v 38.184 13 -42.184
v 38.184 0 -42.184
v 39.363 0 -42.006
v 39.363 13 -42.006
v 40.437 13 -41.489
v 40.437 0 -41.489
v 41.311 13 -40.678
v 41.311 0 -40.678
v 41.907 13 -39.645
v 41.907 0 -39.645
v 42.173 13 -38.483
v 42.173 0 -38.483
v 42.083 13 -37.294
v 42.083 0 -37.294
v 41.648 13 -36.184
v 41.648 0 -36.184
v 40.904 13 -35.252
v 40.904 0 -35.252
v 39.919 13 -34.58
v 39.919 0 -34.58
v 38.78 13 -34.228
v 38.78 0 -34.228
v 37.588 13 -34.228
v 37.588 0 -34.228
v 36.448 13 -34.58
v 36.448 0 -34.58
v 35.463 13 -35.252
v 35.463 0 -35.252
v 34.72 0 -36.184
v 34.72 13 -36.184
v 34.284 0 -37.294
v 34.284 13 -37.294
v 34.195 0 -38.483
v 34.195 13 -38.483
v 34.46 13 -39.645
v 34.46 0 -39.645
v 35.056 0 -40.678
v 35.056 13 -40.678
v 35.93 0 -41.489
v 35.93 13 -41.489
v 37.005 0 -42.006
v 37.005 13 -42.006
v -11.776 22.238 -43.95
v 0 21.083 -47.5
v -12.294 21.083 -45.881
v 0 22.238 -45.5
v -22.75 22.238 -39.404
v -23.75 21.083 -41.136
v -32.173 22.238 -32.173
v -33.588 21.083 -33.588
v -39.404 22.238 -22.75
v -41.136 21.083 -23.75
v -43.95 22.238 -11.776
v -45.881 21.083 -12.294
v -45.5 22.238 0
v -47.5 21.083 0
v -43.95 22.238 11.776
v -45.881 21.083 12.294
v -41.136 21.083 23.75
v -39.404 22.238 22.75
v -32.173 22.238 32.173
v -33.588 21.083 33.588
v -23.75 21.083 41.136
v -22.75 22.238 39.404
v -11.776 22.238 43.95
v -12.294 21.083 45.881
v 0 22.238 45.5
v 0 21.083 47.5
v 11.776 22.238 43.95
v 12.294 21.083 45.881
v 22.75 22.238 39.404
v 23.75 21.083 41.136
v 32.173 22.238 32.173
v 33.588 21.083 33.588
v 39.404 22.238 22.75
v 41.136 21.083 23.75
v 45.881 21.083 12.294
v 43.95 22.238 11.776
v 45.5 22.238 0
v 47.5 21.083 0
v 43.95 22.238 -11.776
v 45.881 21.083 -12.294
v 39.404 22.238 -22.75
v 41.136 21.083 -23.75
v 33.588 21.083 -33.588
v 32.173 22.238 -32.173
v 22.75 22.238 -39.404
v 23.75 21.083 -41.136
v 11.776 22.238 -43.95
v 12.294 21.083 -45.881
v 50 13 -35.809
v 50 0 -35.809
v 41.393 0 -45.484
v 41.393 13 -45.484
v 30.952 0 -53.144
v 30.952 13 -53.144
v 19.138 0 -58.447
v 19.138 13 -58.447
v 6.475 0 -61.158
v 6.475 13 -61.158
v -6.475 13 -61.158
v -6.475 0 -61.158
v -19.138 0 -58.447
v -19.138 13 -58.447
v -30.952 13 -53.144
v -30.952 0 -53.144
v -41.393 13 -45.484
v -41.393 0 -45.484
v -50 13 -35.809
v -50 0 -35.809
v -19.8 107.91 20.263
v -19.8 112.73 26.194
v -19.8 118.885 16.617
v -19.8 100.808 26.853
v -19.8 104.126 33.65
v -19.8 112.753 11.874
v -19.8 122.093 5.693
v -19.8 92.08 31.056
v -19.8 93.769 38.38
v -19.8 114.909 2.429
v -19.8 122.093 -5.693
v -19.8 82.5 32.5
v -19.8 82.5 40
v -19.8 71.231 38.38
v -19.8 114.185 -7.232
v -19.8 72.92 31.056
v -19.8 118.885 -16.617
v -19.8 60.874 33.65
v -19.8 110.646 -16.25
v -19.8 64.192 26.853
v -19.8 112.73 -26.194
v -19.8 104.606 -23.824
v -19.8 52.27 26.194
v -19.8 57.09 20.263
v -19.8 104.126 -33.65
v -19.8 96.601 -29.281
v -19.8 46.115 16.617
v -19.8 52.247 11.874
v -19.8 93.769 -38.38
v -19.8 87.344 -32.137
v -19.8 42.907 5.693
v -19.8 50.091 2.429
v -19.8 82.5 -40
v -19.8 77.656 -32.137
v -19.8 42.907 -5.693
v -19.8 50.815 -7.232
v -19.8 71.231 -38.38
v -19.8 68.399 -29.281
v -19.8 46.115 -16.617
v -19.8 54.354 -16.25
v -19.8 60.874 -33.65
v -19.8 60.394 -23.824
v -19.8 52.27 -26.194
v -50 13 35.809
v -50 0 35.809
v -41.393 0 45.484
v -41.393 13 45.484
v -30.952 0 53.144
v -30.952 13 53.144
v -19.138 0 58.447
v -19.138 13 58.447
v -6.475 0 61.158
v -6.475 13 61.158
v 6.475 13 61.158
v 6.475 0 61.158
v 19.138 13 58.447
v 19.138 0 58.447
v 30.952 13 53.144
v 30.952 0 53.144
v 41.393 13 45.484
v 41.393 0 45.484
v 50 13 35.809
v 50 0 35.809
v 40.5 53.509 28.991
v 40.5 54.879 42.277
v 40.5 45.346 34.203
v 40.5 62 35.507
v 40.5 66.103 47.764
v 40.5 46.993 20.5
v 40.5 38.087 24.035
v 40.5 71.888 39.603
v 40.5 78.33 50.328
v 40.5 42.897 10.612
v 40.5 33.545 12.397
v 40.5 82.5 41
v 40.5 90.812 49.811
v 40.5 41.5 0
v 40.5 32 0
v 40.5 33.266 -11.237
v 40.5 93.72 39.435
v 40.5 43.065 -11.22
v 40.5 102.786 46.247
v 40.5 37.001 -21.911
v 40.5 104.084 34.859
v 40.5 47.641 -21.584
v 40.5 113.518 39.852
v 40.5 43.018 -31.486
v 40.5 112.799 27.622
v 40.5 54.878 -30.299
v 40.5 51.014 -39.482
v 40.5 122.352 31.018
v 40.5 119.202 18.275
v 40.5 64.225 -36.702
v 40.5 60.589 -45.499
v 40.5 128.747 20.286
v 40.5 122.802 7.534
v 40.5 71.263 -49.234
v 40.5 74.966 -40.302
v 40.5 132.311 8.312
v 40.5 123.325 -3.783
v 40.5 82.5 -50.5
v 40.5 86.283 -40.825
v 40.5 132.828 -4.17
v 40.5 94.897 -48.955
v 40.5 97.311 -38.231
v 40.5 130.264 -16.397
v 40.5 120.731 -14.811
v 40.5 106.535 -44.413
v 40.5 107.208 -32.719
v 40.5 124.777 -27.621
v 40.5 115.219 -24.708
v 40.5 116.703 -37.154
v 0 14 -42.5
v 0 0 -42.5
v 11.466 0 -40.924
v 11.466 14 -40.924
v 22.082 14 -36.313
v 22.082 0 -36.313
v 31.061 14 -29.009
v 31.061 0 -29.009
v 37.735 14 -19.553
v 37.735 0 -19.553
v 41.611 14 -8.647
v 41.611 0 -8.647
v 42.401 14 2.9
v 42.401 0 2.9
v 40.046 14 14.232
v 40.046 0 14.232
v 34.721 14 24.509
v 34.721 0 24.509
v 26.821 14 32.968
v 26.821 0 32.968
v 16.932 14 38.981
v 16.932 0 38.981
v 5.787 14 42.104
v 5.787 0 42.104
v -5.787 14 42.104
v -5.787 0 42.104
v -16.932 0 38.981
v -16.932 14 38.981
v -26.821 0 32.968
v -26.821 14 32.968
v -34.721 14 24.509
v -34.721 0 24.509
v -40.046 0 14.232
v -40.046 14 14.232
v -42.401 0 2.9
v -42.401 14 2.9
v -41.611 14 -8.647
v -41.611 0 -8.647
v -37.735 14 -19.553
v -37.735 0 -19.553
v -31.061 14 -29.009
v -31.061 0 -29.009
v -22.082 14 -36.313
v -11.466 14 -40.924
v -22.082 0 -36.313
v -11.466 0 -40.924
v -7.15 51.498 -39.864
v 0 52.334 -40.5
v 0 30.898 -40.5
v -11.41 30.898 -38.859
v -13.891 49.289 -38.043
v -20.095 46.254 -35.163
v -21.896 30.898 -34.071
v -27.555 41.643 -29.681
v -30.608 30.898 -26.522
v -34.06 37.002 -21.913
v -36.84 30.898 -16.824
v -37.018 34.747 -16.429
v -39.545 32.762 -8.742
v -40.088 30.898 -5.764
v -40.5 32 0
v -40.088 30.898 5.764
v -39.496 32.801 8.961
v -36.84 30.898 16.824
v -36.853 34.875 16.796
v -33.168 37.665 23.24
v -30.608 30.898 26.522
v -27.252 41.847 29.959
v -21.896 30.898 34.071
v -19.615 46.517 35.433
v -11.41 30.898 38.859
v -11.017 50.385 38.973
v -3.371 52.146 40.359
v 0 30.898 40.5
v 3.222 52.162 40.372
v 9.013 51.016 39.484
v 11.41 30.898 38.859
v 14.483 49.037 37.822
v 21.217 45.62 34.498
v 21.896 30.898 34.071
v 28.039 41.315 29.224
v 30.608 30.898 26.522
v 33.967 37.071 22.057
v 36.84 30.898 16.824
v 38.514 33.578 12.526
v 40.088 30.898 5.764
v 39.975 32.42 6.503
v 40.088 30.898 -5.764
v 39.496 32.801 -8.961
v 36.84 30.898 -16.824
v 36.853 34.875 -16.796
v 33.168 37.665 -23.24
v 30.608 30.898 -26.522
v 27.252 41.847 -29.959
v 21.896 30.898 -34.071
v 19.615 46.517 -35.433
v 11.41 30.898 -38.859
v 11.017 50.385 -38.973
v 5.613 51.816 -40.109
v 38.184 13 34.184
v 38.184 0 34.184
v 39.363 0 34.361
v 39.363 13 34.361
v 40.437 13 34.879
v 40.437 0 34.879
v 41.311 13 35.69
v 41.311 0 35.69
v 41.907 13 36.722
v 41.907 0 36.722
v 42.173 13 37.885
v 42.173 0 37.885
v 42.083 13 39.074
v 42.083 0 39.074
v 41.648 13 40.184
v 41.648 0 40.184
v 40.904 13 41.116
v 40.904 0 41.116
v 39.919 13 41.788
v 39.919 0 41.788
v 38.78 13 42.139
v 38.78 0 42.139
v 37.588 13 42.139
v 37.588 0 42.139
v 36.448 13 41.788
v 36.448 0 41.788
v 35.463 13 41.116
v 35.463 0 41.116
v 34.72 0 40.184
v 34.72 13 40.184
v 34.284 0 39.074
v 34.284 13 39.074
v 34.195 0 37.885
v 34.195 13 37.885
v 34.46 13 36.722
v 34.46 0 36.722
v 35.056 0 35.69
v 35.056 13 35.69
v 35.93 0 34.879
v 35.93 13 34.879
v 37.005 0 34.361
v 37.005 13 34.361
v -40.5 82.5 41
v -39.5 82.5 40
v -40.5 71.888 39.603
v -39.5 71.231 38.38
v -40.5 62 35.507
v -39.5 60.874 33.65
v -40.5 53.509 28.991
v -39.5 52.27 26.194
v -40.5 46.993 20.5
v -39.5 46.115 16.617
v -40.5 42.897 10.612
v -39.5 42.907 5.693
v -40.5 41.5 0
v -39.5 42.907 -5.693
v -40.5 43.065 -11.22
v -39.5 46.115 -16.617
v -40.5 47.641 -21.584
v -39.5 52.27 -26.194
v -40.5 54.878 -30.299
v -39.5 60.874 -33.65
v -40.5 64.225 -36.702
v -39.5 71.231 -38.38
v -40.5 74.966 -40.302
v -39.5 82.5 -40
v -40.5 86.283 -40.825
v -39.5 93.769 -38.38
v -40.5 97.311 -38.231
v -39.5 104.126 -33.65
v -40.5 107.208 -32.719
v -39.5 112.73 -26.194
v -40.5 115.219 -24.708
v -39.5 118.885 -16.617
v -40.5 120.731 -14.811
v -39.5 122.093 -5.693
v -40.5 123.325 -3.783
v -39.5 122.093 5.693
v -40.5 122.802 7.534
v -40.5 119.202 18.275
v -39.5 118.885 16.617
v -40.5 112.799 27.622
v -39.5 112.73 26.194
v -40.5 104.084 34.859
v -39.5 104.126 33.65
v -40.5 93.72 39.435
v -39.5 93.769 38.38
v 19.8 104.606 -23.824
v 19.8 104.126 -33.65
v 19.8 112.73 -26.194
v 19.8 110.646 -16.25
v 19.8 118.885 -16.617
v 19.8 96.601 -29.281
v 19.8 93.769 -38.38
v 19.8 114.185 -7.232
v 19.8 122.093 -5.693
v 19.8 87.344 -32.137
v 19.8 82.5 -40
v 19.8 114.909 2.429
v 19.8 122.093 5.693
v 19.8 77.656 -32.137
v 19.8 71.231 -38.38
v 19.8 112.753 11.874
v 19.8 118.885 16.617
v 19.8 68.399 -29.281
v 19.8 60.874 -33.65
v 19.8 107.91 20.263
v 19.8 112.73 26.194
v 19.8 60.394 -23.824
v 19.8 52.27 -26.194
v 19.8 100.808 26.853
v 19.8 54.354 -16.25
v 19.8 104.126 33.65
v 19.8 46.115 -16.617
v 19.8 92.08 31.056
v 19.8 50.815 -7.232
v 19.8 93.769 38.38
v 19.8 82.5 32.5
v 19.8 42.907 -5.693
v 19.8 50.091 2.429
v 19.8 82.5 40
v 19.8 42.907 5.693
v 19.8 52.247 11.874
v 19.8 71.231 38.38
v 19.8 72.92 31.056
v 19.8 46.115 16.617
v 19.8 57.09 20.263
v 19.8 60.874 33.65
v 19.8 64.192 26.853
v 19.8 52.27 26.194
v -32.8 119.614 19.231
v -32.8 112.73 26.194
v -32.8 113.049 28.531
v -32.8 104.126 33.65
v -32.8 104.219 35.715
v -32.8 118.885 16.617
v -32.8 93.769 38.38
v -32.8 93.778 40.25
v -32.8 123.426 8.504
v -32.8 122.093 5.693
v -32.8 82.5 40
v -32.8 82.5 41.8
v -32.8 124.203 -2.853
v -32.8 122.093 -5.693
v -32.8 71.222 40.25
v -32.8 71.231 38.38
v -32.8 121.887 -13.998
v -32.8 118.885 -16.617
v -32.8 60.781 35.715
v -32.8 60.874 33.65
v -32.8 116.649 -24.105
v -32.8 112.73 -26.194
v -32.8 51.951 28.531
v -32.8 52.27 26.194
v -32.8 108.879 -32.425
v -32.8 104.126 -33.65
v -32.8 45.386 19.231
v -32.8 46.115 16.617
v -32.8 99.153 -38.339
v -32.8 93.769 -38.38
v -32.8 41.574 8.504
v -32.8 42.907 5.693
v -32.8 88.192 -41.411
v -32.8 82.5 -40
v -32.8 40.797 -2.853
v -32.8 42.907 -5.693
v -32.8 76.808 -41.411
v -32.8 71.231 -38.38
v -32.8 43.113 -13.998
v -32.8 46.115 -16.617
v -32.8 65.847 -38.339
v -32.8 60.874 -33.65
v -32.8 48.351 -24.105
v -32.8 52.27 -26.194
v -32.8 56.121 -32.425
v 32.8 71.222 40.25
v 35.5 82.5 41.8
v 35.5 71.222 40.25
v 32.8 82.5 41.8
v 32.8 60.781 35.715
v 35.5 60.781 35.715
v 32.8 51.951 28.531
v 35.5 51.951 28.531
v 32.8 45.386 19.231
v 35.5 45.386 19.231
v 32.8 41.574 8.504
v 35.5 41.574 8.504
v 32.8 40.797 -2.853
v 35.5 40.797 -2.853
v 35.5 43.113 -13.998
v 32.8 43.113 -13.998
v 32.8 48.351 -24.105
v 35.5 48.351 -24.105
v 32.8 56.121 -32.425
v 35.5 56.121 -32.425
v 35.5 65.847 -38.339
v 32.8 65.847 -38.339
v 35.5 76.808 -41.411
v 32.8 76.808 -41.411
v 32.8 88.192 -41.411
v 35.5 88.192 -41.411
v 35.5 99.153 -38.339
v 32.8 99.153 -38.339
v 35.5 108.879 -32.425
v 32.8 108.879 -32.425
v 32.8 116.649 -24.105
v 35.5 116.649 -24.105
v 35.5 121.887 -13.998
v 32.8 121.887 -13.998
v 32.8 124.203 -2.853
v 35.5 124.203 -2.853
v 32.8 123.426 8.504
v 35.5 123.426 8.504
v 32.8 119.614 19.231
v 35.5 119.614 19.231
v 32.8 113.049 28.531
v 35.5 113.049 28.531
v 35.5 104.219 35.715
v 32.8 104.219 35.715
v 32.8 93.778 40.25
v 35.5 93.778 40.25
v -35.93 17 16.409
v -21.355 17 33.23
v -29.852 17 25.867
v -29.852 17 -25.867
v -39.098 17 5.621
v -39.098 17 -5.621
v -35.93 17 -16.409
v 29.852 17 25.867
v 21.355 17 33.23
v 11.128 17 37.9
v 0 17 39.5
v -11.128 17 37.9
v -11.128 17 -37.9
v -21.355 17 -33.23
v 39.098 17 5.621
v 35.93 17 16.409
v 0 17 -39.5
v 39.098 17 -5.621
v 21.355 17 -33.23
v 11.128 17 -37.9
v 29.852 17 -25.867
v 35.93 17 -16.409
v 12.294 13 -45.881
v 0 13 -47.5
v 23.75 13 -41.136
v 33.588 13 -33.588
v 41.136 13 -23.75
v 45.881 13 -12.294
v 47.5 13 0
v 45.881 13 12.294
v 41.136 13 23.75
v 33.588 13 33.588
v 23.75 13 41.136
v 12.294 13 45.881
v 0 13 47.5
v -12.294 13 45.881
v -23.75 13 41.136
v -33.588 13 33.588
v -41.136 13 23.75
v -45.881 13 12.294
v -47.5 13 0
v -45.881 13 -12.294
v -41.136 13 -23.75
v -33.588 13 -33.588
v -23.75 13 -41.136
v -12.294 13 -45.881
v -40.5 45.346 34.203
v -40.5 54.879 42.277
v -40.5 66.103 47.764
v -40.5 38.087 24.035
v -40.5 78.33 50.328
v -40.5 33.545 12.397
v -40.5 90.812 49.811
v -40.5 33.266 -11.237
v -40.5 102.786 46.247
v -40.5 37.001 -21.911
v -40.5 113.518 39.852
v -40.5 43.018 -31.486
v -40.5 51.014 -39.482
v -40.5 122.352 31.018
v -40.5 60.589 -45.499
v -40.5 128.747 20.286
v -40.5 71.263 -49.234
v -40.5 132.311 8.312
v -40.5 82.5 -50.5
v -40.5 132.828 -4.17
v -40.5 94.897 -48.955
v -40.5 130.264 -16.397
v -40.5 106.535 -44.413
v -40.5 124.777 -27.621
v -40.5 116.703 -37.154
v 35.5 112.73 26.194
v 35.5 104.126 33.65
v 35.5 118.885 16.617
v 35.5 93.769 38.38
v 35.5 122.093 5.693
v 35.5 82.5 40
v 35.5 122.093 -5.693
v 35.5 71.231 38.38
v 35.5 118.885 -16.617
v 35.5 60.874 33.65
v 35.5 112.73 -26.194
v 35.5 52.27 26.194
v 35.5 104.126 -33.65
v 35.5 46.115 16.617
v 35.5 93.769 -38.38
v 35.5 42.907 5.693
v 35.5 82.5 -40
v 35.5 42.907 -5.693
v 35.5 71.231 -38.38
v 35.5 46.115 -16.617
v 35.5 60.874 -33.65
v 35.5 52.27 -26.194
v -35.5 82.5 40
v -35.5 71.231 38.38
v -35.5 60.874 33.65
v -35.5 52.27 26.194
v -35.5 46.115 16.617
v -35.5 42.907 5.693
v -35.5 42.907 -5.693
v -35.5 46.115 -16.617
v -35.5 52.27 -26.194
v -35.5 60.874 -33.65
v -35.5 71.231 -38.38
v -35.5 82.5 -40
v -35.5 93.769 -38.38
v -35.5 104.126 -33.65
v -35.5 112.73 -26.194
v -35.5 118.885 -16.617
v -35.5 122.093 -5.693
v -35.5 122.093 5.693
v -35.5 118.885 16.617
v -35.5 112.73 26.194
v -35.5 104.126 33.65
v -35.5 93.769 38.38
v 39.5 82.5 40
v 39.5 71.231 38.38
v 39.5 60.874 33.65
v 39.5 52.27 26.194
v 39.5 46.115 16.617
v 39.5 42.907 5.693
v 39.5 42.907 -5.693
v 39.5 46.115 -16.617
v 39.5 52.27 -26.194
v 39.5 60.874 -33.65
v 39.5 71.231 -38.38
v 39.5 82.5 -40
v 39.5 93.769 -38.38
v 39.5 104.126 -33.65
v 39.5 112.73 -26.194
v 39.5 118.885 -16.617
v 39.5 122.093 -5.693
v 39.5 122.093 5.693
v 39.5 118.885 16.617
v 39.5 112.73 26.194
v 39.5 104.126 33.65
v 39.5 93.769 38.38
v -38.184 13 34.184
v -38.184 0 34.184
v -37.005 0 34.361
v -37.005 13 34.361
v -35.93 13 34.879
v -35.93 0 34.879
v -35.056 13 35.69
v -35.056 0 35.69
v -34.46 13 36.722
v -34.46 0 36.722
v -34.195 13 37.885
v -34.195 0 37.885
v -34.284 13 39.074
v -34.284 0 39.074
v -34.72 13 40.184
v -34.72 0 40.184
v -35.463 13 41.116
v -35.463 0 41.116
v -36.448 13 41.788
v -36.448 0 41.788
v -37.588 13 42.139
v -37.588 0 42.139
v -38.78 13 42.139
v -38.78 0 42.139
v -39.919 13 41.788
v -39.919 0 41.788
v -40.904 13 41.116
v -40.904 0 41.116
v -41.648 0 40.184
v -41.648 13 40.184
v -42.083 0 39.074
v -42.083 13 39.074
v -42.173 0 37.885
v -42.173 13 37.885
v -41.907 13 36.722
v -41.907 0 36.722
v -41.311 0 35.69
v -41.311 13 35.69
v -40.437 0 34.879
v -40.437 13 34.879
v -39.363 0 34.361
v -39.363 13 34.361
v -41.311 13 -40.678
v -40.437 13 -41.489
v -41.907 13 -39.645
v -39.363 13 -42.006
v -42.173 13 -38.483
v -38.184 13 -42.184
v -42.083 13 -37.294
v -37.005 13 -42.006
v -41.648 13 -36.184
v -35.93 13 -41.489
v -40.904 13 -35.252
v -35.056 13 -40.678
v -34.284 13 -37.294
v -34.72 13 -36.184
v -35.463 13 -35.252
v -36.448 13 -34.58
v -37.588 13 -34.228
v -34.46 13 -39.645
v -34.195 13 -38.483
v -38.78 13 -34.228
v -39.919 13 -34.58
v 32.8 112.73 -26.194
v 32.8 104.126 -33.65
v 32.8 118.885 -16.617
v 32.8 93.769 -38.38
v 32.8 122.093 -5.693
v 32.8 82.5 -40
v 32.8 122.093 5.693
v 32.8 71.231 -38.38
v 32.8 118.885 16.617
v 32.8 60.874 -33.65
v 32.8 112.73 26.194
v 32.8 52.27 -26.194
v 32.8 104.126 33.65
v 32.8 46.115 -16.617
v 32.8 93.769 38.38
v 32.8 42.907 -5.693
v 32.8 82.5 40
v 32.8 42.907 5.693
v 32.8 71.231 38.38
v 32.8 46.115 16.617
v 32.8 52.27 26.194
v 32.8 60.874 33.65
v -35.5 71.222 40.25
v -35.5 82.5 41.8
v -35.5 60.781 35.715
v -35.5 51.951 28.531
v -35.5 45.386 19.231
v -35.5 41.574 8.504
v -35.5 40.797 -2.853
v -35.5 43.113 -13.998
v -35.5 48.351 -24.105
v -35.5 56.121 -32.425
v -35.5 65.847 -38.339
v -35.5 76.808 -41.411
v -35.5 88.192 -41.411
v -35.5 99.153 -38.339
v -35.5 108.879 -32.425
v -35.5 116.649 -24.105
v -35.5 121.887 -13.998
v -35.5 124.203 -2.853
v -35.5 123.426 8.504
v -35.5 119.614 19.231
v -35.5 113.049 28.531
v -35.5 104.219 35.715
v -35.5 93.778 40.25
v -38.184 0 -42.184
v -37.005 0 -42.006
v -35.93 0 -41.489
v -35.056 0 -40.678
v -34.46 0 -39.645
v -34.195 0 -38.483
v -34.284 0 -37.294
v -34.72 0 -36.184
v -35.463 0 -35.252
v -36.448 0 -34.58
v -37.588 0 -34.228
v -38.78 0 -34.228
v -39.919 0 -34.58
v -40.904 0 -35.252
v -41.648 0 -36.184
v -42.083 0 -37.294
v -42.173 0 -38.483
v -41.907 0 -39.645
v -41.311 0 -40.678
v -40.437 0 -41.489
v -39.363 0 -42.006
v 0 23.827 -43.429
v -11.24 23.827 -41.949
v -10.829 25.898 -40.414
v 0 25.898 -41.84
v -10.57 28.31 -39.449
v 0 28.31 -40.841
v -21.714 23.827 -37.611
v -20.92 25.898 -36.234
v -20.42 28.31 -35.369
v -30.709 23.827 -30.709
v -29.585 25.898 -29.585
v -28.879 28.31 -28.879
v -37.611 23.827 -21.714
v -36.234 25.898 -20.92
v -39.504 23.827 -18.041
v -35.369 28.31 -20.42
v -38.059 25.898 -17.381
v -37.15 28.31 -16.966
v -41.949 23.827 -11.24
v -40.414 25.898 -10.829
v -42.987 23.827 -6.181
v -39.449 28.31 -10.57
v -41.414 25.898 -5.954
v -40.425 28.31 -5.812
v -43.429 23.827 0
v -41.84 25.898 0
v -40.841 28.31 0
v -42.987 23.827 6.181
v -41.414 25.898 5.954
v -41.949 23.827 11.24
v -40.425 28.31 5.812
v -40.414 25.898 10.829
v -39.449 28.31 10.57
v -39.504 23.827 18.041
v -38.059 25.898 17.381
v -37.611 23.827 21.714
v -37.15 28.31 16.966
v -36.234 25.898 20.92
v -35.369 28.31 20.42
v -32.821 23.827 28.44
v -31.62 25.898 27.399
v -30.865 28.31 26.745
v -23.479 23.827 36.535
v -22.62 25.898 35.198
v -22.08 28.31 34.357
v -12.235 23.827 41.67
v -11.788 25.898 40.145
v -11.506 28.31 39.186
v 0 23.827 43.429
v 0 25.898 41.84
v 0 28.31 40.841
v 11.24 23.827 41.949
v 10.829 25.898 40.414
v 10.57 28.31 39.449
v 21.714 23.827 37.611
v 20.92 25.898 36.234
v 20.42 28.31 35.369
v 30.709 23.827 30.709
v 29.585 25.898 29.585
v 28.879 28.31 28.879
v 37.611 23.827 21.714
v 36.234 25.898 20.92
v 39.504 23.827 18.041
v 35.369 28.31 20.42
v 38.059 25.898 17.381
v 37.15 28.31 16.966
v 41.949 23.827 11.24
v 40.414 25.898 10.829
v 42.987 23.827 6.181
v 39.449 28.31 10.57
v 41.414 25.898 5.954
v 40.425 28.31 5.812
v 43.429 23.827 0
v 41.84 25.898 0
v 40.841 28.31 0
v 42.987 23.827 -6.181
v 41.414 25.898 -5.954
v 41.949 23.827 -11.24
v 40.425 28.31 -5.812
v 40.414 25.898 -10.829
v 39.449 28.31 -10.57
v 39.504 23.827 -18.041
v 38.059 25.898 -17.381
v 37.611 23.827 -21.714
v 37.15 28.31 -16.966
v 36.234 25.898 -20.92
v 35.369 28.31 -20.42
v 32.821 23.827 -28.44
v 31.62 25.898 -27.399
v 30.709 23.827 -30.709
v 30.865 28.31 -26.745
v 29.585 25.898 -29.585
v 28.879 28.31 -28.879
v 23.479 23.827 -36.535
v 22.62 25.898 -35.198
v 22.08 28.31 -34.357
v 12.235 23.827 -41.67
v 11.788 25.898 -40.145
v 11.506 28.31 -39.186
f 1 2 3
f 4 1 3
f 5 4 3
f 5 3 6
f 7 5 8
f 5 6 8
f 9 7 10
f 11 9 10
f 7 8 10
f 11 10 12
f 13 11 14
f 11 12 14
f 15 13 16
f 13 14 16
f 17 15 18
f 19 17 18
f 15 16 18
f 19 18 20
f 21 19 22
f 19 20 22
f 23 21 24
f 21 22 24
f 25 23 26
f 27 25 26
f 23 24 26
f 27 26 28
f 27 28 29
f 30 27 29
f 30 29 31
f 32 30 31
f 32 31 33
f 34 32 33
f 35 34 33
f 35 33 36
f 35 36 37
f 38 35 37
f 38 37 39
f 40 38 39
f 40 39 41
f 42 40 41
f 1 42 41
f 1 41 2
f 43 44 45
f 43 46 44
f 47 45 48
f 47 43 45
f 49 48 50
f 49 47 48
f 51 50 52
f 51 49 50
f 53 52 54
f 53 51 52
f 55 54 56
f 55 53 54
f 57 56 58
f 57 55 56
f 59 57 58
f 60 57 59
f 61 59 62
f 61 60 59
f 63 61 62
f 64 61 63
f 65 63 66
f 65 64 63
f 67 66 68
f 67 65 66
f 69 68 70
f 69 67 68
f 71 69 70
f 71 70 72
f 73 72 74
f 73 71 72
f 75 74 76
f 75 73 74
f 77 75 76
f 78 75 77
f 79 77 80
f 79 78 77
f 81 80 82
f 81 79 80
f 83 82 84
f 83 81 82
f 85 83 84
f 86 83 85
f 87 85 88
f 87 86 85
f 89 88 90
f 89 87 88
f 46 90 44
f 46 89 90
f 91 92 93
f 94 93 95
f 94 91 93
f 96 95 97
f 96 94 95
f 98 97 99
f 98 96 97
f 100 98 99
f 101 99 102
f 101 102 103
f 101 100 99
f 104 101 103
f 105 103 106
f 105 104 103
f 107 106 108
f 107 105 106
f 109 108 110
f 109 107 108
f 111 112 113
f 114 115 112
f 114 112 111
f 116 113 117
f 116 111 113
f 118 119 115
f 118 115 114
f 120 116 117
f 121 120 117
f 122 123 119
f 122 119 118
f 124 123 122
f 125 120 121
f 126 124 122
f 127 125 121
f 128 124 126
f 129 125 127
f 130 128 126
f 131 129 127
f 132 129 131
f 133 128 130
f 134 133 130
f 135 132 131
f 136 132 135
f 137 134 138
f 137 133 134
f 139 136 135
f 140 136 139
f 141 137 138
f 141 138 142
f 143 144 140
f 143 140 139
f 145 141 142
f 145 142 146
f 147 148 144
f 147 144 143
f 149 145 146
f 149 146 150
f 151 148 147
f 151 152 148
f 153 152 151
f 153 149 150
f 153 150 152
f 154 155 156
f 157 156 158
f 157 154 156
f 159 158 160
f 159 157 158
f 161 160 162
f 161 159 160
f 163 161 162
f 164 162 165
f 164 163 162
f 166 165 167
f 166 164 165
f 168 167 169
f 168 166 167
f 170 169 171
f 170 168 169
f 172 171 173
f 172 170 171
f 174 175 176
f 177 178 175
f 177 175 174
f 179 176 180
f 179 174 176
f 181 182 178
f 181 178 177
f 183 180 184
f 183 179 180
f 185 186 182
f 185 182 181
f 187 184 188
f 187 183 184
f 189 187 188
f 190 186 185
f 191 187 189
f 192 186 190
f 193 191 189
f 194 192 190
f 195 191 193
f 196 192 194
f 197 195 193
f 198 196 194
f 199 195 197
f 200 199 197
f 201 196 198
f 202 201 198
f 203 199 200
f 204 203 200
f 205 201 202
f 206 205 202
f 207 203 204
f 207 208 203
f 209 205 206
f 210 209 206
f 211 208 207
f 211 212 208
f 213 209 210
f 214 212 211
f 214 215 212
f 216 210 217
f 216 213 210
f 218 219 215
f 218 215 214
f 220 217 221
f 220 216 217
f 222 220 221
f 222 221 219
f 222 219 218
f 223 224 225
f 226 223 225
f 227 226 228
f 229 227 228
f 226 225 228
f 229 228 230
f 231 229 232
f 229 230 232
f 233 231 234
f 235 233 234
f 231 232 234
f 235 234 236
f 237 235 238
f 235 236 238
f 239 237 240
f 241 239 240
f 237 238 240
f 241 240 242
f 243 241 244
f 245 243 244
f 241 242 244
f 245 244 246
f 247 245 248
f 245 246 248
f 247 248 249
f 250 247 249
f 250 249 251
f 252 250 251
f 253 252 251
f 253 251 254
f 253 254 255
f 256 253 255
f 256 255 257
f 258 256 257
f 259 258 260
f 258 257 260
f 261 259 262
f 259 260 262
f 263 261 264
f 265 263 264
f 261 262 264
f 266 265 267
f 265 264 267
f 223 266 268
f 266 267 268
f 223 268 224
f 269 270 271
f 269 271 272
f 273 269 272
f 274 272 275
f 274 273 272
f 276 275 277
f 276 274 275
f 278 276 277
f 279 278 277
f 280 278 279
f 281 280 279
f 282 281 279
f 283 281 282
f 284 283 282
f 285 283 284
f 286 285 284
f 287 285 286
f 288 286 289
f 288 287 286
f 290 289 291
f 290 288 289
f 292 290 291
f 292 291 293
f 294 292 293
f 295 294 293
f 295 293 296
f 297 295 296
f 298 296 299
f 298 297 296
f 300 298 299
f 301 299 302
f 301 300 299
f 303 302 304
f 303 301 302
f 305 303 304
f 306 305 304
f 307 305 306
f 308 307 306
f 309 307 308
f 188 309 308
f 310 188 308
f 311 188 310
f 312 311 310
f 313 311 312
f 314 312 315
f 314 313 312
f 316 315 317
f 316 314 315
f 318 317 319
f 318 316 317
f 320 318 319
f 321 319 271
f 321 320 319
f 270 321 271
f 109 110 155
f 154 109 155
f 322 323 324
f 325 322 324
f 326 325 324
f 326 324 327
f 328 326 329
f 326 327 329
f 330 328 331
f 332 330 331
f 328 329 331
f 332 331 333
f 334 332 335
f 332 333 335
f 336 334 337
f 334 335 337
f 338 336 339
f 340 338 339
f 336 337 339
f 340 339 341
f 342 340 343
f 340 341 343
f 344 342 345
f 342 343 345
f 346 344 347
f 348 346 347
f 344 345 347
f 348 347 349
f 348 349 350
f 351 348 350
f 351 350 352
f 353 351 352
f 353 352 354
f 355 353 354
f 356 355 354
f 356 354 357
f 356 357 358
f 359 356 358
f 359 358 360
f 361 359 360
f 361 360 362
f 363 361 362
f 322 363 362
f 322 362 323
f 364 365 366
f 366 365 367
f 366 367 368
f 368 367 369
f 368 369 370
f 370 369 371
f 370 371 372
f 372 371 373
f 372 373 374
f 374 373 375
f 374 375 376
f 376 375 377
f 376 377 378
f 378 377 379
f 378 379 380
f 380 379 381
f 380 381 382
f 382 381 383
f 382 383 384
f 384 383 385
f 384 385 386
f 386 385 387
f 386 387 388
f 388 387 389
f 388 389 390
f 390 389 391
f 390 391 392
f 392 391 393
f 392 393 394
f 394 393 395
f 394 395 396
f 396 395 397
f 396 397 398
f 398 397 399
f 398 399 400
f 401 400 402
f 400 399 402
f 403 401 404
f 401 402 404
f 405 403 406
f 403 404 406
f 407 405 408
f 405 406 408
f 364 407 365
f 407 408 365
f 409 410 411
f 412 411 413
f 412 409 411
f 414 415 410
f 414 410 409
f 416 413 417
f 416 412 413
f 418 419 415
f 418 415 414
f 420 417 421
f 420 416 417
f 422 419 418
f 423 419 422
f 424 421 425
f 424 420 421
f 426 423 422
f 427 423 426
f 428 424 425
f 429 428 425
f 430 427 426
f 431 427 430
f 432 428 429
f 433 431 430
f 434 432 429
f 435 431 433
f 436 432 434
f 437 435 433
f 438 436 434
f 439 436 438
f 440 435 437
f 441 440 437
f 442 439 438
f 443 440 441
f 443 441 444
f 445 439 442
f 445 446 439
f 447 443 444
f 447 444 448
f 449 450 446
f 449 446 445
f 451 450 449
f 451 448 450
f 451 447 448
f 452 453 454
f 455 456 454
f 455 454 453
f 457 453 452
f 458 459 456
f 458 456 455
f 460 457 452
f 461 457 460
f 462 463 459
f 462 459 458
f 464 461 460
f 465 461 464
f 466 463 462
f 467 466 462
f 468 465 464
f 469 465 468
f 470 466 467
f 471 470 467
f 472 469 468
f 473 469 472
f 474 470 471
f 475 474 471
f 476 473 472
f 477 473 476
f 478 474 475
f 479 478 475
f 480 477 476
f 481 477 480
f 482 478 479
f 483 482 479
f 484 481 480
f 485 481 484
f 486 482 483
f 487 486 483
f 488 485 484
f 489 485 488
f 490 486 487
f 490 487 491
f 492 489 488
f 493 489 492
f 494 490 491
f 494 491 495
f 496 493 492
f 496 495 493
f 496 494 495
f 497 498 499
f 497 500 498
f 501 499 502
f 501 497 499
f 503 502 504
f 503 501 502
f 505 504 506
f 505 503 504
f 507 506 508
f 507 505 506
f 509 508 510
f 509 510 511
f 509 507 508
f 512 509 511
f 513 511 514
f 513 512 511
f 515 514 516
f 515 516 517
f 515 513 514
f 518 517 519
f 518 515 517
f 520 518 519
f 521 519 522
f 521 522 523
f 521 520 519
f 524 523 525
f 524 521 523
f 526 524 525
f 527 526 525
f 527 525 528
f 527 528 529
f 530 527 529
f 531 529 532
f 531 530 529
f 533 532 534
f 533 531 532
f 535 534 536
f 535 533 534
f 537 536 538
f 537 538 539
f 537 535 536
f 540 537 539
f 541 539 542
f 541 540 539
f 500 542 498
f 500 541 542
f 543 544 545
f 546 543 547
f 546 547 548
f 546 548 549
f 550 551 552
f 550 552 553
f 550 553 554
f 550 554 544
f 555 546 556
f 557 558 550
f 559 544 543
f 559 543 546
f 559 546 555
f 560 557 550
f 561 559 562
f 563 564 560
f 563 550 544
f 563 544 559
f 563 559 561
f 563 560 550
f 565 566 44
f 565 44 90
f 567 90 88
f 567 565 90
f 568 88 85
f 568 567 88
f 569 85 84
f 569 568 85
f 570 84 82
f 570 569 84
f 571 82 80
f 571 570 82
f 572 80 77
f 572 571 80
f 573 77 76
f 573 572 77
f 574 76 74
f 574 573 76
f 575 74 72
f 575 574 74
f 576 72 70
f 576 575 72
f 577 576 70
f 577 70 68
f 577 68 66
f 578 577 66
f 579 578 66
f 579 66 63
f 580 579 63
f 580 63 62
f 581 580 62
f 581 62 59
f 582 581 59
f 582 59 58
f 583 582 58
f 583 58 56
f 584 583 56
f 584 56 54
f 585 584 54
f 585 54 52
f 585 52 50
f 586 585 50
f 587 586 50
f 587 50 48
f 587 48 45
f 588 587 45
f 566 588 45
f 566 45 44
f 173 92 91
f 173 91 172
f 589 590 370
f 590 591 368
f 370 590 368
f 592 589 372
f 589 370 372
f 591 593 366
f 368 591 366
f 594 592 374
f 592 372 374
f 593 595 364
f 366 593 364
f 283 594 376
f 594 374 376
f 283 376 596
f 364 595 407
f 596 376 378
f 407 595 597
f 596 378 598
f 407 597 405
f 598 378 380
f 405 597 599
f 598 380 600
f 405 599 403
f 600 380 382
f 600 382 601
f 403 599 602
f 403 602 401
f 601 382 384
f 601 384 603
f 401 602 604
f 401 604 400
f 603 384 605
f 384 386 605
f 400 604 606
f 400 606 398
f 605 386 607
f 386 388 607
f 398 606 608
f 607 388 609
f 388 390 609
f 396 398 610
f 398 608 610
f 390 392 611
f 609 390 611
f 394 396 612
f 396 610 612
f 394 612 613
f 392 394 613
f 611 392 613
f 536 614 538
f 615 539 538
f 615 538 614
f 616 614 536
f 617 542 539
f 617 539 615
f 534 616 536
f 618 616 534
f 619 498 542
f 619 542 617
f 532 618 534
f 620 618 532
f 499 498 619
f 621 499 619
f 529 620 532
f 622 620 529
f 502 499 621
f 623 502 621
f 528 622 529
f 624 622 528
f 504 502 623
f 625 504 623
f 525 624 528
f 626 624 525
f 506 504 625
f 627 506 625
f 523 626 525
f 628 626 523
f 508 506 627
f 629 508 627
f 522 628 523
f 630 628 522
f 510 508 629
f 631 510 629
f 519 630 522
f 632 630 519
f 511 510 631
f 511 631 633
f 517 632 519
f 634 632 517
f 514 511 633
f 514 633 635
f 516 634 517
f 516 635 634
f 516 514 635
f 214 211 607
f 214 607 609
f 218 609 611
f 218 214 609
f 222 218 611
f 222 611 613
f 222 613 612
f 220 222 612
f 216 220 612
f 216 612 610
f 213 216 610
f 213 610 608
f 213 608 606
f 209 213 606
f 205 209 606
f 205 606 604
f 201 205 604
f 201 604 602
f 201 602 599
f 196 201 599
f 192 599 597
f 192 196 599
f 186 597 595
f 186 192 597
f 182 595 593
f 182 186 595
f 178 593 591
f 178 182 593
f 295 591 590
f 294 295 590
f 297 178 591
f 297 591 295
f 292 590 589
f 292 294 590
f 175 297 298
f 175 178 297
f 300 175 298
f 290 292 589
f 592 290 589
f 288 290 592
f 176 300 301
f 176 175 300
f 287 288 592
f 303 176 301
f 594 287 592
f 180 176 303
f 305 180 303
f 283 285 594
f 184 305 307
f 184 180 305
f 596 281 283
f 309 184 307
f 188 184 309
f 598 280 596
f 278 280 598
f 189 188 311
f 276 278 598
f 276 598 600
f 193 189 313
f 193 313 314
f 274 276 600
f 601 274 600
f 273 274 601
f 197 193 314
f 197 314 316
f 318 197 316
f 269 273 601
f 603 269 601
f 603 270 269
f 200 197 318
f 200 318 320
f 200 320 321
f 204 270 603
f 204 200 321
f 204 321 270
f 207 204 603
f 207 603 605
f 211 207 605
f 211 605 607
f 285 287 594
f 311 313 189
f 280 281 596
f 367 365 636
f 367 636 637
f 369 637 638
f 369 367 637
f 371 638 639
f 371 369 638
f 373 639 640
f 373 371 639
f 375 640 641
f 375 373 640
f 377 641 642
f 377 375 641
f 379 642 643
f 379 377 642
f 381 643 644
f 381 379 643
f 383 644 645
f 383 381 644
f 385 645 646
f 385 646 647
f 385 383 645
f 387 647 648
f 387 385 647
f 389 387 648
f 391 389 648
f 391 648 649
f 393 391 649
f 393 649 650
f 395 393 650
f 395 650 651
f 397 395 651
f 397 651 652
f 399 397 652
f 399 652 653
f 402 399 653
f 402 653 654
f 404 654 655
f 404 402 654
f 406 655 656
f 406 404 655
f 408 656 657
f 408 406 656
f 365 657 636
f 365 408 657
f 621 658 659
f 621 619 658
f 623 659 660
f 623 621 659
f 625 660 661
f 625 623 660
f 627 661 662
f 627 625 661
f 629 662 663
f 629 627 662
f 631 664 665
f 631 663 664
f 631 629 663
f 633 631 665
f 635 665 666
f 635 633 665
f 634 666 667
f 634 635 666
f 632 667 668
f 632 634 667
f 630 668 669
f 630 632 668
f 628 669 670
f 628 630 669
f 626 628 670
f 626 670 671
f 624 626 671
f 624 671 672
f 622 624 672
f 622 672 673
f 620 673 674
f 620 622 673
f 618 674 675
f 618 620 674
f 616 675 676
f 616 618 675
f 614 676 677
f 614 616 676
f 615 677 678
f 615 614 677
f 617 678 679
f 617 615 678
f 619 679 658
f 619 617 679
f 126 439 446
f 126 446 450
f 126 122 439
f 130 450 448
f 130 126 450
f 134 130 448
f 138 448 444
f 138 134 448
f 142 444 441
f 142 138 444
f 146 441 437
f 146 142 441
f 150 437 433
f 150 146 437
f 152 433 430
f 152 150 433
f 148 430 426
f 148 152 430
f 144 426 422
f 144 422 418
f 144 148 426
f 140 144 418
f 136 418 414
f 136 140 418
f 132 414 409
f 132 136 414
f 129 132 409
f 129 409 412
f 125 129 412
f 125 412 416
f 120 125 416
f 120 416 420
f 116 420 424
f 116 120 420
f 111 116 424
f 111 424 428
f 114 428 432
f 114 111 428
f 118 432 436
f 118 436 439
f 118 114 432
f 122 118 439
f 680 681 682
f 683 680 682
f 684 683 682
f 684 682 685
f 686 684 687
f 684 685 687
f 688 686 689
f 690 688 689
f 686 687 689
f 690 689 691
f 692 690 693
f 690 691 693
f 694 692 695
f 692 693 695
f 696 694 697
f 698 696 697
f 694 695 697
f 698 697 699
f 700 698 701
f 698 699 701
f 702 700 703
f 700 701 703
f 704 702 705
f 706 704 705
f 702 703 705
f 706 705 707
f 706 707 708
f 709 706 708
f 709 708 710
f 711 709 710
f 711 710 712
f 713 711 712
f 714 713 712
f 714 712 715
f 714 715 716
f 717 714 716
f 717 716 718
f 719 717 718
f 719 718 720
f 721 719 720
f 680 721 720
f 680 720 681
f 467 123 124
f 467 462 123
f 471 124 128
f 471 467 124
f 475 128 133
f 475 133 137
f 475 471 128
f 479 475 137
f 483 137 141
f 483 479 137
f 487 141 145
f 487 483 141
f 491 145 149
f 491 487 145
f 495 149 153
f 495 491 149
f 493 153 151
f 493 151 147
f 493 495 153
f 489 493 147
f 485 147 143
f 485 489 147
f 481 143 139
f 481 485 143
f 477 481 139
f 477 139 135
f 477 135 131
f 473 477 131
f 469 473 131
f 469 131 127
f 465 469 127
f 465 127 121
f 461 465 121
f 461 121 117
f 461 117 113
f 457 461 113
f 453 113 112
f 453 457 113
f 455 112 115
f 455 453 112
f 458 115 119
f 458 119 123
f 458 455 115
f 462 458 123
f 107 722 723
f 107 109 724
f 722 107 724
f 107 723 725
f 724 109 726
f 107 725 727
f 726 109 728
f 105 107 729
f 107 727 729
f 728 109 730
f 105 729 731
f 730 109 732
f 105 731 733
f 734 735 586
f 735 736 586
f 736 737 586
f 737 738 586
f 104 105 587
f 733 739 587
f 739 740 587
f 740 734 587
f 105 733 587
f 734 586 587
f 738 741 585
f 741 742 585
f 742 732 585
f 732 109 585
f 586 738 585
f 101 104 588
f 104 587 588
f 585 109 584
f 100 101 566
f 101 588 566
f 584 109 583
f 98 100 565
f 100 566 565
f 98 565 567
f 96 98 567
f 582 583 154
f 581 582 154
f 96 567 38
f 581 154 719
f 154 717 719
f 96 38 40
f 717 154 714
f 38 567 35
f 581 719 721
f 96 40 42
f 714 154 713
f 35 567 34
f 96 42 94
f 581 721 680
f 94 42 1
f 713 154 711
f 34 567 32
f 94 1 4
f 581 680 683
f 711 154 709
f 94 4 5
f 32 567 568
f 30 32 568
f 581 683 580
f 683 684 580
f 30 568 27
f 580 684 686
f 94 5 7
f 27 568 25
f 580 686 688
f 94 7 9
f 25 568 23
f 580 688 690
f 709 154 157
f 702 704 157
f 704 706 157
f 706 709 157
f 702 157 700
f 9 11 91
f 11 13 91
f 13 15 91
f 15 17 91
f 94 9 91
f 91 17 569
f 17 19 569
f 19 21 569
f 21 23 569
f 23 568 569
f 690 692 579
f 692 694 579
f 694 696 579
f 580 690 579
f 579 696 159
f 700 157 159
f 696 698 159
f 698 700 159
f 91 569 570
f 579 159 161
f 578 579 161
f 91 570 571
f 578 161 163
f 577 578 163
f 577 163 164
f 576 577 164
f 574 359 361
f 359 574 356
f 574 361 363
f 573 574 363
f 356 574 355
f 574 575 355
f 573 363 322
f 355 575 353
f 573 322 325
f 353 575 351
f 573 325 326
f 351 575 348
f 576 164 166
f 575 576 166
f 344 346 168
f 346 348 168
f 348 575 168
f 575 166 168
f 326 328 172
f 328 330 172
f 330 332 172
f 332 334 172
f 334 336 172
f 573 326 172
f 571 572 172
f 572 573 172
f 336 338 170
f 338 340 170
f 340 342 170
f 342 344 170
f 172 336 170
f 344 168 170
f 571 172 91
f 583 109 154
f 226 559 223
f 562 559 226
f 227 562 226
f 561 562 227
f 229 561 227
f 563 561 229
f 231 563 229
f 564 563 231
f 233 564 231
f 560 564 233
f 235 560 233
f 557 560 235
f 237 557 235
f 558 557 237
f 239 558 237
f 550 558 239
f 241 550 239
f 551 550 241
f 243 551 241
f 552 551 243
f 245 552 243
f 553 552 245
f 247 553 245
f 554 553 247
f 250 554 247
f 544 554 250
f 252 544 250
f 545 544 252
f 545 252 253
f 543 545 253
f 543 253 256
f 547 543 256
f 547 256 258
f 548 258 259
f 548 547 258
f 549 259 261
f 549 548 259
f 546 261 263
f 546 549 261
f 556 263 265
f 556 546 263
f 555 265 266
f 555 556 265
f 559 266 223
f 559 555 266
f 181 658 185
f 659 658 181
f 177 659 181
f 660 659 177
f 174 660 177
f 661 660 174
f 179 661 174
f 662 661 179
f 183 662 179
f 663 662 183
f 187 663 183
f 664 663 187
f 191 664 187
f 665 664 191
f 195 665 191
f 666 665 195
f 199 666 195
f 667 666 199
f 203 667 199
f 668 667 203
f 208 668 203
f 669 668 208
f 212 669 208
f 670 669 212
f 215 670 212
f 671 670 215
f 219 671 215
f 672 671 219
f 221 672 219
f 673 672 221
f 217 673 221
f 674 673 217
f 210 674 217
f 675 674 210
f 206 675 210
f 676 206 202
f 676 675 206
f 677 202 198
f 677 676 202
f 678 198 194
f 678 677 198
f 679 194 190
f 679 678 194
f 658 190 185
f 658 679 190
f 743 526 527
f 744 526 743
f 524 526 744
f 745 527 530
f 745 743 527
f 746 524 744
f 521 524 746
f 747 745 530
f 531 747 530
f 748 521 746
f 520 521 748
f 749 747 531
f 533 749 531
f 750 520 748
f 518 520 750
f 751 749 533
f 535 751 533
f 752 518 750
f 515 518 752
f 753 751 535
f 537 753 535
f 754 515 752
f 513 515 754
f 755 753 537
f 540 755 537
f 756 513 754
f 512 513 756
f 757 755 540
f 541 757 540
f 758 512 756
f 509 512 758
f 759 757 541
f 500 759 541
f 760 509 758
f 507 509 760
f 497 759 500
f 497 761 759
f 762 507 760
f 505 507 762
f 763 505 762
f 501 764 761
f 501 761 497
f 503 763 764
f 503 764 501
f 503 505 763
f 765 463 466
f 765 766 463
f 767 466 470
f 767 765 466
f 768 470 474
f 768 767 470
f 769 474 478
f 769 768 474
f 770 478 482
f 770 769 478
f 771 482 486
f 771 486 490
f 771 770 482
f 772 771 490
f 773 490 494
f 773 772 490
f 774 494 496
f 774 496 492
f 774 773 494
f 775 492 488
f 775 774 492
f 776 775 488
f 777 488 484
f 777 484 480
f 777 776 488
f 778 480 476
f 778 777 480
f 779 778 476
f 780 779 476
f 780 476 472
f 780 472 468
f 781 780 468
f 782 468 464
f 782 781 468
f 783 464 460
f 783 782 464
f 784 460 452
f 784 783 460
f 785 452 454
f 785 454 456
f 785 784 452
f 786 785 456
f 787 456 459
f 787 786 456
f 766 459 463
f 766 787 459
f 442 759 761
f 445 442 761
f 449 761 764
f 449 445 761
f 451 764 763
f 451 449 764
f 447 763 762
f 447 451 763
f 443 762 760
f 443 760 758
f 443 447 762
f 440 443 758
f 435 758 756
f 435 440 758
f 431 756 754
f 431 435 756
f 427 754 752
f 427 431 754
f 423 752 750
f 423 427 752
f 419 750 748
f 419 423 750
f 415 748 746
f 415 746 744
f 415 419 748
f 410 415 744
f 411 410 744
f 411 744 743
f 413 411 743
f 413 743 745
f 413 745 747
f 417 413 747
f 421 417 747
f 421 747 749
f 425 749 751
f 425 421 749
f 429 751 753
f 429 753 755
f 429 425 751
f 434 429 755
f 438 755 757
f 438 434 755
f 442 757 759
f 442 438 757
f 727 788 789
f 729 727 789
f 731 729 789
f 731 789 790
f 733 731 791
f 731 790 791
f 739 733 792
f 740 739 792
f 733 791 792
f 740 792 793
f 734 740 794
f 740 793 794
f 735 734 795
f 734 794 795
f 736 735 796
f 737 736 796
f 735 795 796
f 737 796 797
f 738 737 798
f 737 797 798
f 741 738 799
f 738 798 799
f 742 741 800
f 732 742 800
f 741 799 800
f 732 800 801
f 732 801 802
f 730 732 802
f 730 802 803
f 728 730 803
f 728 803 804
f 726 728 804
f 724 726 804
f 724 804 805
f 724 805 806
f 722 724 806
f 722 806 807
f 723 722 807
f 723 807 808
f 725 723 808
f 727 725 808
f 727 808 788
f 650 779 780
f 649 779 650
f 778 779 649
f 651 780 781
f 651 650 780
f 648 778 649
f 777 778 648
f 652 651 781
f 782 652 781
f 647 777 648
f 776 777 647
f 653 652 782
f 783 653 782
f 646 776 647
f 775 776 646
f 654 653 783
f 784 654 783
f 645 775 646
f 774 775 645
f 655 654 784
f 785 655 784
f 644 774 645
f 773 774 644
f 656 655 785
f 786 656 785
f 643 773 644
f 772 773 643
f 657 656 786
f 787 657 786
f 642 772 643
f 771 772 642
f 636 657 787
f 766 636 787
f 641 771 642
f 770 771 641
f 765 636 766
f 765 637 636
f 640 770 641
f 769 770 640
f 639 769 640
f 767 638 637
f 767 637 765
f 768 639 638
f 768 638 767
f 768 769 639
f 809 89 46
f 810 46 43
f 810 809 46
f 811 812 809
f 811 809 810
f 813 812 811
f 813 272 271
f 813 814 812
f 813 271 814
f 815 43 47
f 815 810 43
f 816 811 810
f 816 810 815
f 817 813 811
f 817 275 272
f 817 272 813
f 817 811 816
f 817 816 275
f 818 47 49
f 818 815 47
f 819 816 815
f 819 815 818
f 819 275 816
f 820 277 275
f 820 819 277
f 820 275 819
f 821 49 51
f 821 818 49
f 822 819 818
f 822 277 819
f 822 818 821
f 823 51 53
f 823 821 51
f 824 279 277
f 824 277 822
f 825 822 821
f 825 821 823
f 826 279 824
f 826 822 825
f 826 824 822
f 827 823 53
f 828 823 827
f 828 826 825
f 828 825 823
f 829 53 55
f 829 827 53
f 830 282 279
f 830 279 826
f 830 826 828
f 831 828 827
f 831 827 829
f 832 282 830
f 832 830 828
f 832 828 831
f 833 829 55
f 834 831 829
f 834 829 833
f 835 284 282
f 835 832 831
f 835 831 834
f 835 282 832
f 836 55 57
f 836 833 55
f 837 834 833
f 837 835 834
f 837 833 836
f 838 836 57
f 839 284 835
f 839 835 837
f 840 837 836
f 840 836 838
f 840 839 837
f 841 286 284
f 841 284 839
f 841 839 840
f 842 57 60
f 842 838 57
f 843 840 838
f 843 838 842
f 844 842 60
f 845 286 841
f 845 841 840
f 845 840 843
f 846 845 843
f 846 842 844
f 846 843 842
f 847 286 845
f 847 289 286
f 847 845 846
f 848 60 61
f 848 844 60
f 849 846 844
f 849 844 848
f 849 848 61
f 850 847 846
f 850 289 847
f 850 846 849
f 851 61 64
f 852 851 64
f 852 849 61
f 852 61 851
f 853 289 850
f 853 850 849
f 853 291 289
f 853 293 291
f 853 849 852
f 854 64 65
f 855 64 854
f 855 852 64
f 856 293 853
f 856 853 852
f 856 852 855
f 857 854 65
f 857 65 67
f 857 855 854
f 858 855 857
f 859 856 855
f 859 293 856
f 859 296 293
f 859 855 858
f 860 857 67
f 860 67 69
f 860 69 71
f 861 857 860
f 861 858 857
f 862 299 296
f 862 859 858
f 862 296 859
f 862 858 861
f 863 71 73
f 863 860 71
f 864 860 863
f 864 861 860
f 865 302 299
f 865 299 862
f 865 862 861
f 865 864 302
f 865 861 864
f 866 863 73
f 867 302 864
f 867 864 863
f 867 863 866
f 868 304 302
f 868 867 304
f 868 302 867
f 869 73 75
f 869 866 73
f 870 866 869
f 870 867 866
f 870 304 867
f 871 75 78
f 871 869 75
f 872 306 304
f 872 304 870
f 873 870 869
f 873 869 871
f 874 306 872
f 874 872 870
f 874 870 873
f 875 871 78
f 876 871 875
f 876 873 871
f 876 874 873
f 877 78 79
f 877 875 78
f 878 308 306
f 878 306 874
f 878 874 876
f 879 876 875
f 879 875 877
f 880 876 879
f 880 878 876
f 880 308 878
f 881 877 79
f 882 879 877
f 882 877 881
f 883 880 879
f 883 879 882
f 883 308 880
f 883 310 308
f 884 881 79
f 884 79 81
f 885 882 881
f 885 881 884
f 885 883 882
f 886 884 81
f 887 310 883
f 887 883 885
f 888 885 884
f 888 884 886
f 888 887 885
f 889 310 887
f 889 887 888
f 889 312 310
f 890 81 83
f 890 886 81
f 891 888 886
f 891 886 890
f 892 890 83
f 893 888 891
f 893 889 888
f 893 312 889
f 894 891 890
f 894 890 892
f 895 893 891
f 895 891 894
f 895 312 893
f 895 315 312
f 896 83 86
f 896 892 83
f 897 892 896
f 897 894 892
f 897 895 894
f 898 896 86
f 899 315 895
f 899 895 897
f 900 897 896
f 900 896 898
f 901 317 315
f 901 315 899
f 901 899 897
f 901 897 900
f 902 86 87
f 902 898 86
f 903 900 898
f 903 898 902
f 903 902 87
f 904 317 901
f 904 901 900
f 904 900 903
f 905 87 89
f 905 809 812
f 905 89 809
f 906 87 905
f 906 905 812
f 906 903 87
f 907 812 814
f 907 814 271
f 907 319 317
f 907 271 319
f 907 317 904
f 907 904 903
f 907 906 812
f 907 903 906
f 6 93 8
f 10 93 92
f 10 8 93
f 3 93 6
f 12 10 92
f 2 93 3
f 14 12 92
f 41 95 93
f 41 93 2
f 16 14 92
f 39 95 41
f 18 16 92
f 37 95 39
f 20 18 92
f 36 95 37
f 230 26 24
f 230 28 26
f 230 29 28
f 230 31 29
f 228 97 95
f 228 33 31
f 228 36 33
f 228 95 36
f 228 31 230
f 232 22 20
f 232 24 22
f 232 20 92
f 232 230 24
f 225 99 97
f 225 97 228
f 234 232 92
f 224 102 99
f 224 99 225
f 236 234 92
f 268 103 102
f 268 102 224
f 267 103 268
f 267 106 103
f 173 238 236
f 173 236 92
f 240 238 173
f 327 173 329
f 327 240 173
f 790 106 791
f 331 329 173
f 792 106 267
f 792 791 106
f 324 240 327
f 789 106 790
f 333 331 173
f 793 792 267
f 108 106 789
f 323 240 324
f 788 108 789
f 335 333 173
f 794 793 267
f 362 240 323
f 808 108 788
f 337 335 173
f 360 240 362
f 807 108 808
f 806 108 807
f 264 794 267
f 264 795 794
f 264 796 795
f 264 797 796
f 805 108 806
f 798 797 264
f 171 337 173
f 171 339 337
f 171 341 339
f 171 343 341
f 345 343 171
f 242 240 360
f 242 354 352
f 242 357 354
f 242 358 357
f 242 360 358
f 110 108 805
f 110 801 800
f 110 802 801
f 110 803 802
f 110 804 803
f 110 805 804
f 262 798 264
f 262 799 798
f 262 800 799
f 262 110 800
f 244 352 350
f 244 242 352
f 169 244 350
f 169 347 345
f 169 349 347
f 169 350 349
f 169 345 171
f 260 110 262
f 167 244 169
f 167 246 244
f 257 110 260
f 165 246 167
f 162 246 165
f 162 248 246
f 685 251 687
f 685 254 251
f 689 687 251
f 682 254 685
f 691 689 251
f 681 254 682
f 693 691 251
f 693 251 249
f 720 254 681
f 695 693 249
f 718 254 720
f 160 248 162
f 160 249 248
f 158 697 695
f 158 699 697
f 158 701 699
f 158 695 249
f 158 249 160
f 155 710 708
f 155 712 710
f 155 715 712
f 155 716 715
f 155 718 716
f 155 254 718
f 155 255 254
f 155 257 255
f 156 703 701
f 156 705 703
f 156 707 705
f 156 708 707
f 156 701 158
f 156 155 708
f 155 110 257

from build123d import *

# Parameters (mm, degrees)
SKETCH3_R           = 50.5
BOSS_EXTRUDE1_DEPTH = 40.5
SKETCH5_W           = 20
SKETCH5_H           = 130
CUT_EXTRUDE1_DEPTH  = 81
SKETCH9_R           = 4
CUT_EXTRUDE4_DEPTH  = 20
SKETCH10_R          = 42.5
CUT_EXTRUDE5_DEPTH  = 17
CHAMFER1_SIZE       = 1
CHAMFER2_SIZE       = 3
CUT_EXTRUDE8_START  = -13
SKETCH13_OUTSIDE_W  = 143.386
SKETCH13_OUTSIDE_H  = 166.386
SKETCH13_OUTSIDE_R  = 47.5
CUT_EXTRUDE8_DEPTH  = 10


with BuildPart() as part:
    # Sketch1 → Revolve1 (revolve)
    with BuildSketch(Plane.XY, mode=Mode.PRIVATE) as revolve1_sk:
        with BuildLine():
            Line((0, 0), (-61.5, 0))
            Line((-61.5, 0), (-61.5, 13))
            Line((-61.5, 13), (-45.5, 22.237604307))
            ThreePointArc((-45.5, 22.237604307), (-41.839745962, 25.897858345), (-40.5, 30.897858345))
            Line((-40.5, 30.897858345), (-40.5, 80))
            Line((-40.5, 80), (0, 80))
            Line((0, 80), (0, 0))
        make_face()
    revolve(revolve1_sk.sketch.rotate(Axis((0, 0, 0), (0, 1, 0)), 270), axis=Axis((0, 0, 0), (0, 1, 0)))

    # Sketch3 → Boss-Extrude1 (add, symmetric)
    with BuildSketch(Plane(origin=(0, 0, 0), x_dir=(0, 0, -1), z_dir=(1, 0, 0))):
        with Locations((0, 82.5)):
            Circle(SKETCH3_R)
    extrude(amount=BOSS_EXTRUDE1_DEPTH, both=True)

    # Sketch5 → Cut-Extrude1 (cut)
    with BuildSketch(Plane.XZ):
        with Locations((60, 0)):
            Rectangle(SKETCH5_W, SKETCH5_H)
        with Locations((-60, 0)):
            Rectangle(SKETCH5_W, SKETCH5_H)
    extrude(amount=-CUT_EXTRUDE1_DEPTH, mode=Mode.SUBTRACT)

    # Sketch6 → Cut-Revolve1 (revolve, cut)
    with BuildSketch(Plane.XY, mode=Mode.PRIVATE) as cut_revolve1_sk:
        Polygon((-35.5, 122.5), (-40.5, 122.5), (-40.5, 82.5), (40.5, 82.5), (40.5, 122.5), (35.5, 122.5), (35.5, 124.3), (32.8, 124.3), (32.8, 122.5), (19.8, 122.5), (19.8, 115), (-19.8, 115), (-19.8, 122.5), (-32.8, 122.5), (-32.8, 124.3), (-35.5, 124.3), align=None)
    revolve(cut_revolve1_sk.sketch.rotate(Axis((40.5, 82.5, 0), (1, 0, 0)), 90), axis=Axis((40.5, 82.5, 0), (1, 0, 0)), mode=Mode.SUBTRACT)

    # Sketch9 → Cut-Extrude4 (cut)
    with BuildSketch(Plane.XZ):
        with Locations(Location((38.183766184, 38.183766184, 0), (0, 0, 270))):
            Circle(SKETCH9_R)
        with Locations(Location((-38.183766184, 38.183766184, 0), (0, 0, 270))):
            Circle(SKETCH9_R)
        with Locations(Location((-38.183766184, -38.183766184, 0), (0, 0, 270))):
            Circle(SKETCH9_R)
        with Locations(Location((38.183766184, -38.183766184, 0), (0, 0, 270))):
            Circle(SKETCH9_R)
    extrude(amount=-CUT_EXTRUDE4_DEPTH, mode=Mode.SUBTRACT)

    # Sketch10 → Cut-Extrude5 (cut)
    with BuildSketch(Plane.XZ):
        with Locations(Location((0, 0, 0), (0, 0, 270))):
            Circle(SKETCH10_R)
    extrude(amount=-CUT_EXTRUDE5_DEPTH, mode=Mode.SUBTRACT)

    # Chamfer1
    # the kernel refuses this chamfer: 1 mm, written as the material it takes off along each edge
    with BuildSketch(Plane(origin=(-40.5, 82.5, 0), x_dir=(0, -1, 0), z_dir=(0, 0, 1))) as chamfer1_piece_1:
        Polygon((40 + CHAMFER1_SIZE, 0), (40, CHAMFER1_SIZE), (40, 0), align=None)
    revolve(axis=Axis((-40.5, 82.5, 0), (1, 0, 0)), revolution_arc=270, mode=Mode.SUBTRACT)
    with BuildSketch(Plane(origin=(40.5, 82.5, 0), x_dir=(0, -1, 0), z_dir=(0, 0, 1))) as chamfer1_piece_2:
        Polygon((40 + CHAMFER1_SIZE, 0), (40, -CHAMFER1_SIZE), (40, 0), align=None)
    revolve(axis=Axis((40.5, 82.5, 0), (1, 0, 0)), revolution_arc=270, mode=Mode.SUBTRACT)
    with BuildSketch(Plane(origin=(40.5, 82.5, 0), x_dir=(0, 0, 1), z_dir=(0, 1, 0))) as chamfer1_piece_3:
        Polygon((40 + CHAMFER1_SIZE, 0), (40, -CHAMFER1_SIZE), (40, 0), align=None)
    revolve(axis=Axis((40.5, 82.5, 0), (1, 0, 0)), revolution_arc=90, mode=Mode.SUBTRACT)
    with BuildSketch(Plane(origin=(-40.5, 82.5, 0), x_dir=(0, 0, 1), z_dir=(0, 1, 0))) as chamfer1_piece_4:
        Polygon((40 + CHAMFER1_SIZE, 0), (40, CHAMFER1_SIZE), (40, 0), align=None)
    revolve(axis=Axis((-40.5, 82.5, 0), (1, 0, 0)), revolution_arc=90, mode=Mode.SUBTRACT)

    # Chamfer2
    chamfer2_edges = [part.edges().sort_by_distance(p)[0] for p in [
        (0, 17, 42.5),
    ]]
    chamfer(chamfer2_edges, length=CHAMFER2_SIZE)

    # Sketch13 outside → Cut-Extrude8 (cut)
    with BuildSketch(Plane.XZ.offset(CUT_EXTRUDE8_START)):
        Rectangle(SKETCH13_OUTSIDE_W, SKETCH13_OUTSIDE_H)
        with Locations(Location((0, 0, 0), (0, 0, 270))):
            Circle(SKETCH13_OUTSIDE_R, mode=Mode.SUBTRACT)
    extrude(amount=-CUT_EXTRUDE8_DEPTH, mode=Mode.SUBTRACT)


solid = part.part
